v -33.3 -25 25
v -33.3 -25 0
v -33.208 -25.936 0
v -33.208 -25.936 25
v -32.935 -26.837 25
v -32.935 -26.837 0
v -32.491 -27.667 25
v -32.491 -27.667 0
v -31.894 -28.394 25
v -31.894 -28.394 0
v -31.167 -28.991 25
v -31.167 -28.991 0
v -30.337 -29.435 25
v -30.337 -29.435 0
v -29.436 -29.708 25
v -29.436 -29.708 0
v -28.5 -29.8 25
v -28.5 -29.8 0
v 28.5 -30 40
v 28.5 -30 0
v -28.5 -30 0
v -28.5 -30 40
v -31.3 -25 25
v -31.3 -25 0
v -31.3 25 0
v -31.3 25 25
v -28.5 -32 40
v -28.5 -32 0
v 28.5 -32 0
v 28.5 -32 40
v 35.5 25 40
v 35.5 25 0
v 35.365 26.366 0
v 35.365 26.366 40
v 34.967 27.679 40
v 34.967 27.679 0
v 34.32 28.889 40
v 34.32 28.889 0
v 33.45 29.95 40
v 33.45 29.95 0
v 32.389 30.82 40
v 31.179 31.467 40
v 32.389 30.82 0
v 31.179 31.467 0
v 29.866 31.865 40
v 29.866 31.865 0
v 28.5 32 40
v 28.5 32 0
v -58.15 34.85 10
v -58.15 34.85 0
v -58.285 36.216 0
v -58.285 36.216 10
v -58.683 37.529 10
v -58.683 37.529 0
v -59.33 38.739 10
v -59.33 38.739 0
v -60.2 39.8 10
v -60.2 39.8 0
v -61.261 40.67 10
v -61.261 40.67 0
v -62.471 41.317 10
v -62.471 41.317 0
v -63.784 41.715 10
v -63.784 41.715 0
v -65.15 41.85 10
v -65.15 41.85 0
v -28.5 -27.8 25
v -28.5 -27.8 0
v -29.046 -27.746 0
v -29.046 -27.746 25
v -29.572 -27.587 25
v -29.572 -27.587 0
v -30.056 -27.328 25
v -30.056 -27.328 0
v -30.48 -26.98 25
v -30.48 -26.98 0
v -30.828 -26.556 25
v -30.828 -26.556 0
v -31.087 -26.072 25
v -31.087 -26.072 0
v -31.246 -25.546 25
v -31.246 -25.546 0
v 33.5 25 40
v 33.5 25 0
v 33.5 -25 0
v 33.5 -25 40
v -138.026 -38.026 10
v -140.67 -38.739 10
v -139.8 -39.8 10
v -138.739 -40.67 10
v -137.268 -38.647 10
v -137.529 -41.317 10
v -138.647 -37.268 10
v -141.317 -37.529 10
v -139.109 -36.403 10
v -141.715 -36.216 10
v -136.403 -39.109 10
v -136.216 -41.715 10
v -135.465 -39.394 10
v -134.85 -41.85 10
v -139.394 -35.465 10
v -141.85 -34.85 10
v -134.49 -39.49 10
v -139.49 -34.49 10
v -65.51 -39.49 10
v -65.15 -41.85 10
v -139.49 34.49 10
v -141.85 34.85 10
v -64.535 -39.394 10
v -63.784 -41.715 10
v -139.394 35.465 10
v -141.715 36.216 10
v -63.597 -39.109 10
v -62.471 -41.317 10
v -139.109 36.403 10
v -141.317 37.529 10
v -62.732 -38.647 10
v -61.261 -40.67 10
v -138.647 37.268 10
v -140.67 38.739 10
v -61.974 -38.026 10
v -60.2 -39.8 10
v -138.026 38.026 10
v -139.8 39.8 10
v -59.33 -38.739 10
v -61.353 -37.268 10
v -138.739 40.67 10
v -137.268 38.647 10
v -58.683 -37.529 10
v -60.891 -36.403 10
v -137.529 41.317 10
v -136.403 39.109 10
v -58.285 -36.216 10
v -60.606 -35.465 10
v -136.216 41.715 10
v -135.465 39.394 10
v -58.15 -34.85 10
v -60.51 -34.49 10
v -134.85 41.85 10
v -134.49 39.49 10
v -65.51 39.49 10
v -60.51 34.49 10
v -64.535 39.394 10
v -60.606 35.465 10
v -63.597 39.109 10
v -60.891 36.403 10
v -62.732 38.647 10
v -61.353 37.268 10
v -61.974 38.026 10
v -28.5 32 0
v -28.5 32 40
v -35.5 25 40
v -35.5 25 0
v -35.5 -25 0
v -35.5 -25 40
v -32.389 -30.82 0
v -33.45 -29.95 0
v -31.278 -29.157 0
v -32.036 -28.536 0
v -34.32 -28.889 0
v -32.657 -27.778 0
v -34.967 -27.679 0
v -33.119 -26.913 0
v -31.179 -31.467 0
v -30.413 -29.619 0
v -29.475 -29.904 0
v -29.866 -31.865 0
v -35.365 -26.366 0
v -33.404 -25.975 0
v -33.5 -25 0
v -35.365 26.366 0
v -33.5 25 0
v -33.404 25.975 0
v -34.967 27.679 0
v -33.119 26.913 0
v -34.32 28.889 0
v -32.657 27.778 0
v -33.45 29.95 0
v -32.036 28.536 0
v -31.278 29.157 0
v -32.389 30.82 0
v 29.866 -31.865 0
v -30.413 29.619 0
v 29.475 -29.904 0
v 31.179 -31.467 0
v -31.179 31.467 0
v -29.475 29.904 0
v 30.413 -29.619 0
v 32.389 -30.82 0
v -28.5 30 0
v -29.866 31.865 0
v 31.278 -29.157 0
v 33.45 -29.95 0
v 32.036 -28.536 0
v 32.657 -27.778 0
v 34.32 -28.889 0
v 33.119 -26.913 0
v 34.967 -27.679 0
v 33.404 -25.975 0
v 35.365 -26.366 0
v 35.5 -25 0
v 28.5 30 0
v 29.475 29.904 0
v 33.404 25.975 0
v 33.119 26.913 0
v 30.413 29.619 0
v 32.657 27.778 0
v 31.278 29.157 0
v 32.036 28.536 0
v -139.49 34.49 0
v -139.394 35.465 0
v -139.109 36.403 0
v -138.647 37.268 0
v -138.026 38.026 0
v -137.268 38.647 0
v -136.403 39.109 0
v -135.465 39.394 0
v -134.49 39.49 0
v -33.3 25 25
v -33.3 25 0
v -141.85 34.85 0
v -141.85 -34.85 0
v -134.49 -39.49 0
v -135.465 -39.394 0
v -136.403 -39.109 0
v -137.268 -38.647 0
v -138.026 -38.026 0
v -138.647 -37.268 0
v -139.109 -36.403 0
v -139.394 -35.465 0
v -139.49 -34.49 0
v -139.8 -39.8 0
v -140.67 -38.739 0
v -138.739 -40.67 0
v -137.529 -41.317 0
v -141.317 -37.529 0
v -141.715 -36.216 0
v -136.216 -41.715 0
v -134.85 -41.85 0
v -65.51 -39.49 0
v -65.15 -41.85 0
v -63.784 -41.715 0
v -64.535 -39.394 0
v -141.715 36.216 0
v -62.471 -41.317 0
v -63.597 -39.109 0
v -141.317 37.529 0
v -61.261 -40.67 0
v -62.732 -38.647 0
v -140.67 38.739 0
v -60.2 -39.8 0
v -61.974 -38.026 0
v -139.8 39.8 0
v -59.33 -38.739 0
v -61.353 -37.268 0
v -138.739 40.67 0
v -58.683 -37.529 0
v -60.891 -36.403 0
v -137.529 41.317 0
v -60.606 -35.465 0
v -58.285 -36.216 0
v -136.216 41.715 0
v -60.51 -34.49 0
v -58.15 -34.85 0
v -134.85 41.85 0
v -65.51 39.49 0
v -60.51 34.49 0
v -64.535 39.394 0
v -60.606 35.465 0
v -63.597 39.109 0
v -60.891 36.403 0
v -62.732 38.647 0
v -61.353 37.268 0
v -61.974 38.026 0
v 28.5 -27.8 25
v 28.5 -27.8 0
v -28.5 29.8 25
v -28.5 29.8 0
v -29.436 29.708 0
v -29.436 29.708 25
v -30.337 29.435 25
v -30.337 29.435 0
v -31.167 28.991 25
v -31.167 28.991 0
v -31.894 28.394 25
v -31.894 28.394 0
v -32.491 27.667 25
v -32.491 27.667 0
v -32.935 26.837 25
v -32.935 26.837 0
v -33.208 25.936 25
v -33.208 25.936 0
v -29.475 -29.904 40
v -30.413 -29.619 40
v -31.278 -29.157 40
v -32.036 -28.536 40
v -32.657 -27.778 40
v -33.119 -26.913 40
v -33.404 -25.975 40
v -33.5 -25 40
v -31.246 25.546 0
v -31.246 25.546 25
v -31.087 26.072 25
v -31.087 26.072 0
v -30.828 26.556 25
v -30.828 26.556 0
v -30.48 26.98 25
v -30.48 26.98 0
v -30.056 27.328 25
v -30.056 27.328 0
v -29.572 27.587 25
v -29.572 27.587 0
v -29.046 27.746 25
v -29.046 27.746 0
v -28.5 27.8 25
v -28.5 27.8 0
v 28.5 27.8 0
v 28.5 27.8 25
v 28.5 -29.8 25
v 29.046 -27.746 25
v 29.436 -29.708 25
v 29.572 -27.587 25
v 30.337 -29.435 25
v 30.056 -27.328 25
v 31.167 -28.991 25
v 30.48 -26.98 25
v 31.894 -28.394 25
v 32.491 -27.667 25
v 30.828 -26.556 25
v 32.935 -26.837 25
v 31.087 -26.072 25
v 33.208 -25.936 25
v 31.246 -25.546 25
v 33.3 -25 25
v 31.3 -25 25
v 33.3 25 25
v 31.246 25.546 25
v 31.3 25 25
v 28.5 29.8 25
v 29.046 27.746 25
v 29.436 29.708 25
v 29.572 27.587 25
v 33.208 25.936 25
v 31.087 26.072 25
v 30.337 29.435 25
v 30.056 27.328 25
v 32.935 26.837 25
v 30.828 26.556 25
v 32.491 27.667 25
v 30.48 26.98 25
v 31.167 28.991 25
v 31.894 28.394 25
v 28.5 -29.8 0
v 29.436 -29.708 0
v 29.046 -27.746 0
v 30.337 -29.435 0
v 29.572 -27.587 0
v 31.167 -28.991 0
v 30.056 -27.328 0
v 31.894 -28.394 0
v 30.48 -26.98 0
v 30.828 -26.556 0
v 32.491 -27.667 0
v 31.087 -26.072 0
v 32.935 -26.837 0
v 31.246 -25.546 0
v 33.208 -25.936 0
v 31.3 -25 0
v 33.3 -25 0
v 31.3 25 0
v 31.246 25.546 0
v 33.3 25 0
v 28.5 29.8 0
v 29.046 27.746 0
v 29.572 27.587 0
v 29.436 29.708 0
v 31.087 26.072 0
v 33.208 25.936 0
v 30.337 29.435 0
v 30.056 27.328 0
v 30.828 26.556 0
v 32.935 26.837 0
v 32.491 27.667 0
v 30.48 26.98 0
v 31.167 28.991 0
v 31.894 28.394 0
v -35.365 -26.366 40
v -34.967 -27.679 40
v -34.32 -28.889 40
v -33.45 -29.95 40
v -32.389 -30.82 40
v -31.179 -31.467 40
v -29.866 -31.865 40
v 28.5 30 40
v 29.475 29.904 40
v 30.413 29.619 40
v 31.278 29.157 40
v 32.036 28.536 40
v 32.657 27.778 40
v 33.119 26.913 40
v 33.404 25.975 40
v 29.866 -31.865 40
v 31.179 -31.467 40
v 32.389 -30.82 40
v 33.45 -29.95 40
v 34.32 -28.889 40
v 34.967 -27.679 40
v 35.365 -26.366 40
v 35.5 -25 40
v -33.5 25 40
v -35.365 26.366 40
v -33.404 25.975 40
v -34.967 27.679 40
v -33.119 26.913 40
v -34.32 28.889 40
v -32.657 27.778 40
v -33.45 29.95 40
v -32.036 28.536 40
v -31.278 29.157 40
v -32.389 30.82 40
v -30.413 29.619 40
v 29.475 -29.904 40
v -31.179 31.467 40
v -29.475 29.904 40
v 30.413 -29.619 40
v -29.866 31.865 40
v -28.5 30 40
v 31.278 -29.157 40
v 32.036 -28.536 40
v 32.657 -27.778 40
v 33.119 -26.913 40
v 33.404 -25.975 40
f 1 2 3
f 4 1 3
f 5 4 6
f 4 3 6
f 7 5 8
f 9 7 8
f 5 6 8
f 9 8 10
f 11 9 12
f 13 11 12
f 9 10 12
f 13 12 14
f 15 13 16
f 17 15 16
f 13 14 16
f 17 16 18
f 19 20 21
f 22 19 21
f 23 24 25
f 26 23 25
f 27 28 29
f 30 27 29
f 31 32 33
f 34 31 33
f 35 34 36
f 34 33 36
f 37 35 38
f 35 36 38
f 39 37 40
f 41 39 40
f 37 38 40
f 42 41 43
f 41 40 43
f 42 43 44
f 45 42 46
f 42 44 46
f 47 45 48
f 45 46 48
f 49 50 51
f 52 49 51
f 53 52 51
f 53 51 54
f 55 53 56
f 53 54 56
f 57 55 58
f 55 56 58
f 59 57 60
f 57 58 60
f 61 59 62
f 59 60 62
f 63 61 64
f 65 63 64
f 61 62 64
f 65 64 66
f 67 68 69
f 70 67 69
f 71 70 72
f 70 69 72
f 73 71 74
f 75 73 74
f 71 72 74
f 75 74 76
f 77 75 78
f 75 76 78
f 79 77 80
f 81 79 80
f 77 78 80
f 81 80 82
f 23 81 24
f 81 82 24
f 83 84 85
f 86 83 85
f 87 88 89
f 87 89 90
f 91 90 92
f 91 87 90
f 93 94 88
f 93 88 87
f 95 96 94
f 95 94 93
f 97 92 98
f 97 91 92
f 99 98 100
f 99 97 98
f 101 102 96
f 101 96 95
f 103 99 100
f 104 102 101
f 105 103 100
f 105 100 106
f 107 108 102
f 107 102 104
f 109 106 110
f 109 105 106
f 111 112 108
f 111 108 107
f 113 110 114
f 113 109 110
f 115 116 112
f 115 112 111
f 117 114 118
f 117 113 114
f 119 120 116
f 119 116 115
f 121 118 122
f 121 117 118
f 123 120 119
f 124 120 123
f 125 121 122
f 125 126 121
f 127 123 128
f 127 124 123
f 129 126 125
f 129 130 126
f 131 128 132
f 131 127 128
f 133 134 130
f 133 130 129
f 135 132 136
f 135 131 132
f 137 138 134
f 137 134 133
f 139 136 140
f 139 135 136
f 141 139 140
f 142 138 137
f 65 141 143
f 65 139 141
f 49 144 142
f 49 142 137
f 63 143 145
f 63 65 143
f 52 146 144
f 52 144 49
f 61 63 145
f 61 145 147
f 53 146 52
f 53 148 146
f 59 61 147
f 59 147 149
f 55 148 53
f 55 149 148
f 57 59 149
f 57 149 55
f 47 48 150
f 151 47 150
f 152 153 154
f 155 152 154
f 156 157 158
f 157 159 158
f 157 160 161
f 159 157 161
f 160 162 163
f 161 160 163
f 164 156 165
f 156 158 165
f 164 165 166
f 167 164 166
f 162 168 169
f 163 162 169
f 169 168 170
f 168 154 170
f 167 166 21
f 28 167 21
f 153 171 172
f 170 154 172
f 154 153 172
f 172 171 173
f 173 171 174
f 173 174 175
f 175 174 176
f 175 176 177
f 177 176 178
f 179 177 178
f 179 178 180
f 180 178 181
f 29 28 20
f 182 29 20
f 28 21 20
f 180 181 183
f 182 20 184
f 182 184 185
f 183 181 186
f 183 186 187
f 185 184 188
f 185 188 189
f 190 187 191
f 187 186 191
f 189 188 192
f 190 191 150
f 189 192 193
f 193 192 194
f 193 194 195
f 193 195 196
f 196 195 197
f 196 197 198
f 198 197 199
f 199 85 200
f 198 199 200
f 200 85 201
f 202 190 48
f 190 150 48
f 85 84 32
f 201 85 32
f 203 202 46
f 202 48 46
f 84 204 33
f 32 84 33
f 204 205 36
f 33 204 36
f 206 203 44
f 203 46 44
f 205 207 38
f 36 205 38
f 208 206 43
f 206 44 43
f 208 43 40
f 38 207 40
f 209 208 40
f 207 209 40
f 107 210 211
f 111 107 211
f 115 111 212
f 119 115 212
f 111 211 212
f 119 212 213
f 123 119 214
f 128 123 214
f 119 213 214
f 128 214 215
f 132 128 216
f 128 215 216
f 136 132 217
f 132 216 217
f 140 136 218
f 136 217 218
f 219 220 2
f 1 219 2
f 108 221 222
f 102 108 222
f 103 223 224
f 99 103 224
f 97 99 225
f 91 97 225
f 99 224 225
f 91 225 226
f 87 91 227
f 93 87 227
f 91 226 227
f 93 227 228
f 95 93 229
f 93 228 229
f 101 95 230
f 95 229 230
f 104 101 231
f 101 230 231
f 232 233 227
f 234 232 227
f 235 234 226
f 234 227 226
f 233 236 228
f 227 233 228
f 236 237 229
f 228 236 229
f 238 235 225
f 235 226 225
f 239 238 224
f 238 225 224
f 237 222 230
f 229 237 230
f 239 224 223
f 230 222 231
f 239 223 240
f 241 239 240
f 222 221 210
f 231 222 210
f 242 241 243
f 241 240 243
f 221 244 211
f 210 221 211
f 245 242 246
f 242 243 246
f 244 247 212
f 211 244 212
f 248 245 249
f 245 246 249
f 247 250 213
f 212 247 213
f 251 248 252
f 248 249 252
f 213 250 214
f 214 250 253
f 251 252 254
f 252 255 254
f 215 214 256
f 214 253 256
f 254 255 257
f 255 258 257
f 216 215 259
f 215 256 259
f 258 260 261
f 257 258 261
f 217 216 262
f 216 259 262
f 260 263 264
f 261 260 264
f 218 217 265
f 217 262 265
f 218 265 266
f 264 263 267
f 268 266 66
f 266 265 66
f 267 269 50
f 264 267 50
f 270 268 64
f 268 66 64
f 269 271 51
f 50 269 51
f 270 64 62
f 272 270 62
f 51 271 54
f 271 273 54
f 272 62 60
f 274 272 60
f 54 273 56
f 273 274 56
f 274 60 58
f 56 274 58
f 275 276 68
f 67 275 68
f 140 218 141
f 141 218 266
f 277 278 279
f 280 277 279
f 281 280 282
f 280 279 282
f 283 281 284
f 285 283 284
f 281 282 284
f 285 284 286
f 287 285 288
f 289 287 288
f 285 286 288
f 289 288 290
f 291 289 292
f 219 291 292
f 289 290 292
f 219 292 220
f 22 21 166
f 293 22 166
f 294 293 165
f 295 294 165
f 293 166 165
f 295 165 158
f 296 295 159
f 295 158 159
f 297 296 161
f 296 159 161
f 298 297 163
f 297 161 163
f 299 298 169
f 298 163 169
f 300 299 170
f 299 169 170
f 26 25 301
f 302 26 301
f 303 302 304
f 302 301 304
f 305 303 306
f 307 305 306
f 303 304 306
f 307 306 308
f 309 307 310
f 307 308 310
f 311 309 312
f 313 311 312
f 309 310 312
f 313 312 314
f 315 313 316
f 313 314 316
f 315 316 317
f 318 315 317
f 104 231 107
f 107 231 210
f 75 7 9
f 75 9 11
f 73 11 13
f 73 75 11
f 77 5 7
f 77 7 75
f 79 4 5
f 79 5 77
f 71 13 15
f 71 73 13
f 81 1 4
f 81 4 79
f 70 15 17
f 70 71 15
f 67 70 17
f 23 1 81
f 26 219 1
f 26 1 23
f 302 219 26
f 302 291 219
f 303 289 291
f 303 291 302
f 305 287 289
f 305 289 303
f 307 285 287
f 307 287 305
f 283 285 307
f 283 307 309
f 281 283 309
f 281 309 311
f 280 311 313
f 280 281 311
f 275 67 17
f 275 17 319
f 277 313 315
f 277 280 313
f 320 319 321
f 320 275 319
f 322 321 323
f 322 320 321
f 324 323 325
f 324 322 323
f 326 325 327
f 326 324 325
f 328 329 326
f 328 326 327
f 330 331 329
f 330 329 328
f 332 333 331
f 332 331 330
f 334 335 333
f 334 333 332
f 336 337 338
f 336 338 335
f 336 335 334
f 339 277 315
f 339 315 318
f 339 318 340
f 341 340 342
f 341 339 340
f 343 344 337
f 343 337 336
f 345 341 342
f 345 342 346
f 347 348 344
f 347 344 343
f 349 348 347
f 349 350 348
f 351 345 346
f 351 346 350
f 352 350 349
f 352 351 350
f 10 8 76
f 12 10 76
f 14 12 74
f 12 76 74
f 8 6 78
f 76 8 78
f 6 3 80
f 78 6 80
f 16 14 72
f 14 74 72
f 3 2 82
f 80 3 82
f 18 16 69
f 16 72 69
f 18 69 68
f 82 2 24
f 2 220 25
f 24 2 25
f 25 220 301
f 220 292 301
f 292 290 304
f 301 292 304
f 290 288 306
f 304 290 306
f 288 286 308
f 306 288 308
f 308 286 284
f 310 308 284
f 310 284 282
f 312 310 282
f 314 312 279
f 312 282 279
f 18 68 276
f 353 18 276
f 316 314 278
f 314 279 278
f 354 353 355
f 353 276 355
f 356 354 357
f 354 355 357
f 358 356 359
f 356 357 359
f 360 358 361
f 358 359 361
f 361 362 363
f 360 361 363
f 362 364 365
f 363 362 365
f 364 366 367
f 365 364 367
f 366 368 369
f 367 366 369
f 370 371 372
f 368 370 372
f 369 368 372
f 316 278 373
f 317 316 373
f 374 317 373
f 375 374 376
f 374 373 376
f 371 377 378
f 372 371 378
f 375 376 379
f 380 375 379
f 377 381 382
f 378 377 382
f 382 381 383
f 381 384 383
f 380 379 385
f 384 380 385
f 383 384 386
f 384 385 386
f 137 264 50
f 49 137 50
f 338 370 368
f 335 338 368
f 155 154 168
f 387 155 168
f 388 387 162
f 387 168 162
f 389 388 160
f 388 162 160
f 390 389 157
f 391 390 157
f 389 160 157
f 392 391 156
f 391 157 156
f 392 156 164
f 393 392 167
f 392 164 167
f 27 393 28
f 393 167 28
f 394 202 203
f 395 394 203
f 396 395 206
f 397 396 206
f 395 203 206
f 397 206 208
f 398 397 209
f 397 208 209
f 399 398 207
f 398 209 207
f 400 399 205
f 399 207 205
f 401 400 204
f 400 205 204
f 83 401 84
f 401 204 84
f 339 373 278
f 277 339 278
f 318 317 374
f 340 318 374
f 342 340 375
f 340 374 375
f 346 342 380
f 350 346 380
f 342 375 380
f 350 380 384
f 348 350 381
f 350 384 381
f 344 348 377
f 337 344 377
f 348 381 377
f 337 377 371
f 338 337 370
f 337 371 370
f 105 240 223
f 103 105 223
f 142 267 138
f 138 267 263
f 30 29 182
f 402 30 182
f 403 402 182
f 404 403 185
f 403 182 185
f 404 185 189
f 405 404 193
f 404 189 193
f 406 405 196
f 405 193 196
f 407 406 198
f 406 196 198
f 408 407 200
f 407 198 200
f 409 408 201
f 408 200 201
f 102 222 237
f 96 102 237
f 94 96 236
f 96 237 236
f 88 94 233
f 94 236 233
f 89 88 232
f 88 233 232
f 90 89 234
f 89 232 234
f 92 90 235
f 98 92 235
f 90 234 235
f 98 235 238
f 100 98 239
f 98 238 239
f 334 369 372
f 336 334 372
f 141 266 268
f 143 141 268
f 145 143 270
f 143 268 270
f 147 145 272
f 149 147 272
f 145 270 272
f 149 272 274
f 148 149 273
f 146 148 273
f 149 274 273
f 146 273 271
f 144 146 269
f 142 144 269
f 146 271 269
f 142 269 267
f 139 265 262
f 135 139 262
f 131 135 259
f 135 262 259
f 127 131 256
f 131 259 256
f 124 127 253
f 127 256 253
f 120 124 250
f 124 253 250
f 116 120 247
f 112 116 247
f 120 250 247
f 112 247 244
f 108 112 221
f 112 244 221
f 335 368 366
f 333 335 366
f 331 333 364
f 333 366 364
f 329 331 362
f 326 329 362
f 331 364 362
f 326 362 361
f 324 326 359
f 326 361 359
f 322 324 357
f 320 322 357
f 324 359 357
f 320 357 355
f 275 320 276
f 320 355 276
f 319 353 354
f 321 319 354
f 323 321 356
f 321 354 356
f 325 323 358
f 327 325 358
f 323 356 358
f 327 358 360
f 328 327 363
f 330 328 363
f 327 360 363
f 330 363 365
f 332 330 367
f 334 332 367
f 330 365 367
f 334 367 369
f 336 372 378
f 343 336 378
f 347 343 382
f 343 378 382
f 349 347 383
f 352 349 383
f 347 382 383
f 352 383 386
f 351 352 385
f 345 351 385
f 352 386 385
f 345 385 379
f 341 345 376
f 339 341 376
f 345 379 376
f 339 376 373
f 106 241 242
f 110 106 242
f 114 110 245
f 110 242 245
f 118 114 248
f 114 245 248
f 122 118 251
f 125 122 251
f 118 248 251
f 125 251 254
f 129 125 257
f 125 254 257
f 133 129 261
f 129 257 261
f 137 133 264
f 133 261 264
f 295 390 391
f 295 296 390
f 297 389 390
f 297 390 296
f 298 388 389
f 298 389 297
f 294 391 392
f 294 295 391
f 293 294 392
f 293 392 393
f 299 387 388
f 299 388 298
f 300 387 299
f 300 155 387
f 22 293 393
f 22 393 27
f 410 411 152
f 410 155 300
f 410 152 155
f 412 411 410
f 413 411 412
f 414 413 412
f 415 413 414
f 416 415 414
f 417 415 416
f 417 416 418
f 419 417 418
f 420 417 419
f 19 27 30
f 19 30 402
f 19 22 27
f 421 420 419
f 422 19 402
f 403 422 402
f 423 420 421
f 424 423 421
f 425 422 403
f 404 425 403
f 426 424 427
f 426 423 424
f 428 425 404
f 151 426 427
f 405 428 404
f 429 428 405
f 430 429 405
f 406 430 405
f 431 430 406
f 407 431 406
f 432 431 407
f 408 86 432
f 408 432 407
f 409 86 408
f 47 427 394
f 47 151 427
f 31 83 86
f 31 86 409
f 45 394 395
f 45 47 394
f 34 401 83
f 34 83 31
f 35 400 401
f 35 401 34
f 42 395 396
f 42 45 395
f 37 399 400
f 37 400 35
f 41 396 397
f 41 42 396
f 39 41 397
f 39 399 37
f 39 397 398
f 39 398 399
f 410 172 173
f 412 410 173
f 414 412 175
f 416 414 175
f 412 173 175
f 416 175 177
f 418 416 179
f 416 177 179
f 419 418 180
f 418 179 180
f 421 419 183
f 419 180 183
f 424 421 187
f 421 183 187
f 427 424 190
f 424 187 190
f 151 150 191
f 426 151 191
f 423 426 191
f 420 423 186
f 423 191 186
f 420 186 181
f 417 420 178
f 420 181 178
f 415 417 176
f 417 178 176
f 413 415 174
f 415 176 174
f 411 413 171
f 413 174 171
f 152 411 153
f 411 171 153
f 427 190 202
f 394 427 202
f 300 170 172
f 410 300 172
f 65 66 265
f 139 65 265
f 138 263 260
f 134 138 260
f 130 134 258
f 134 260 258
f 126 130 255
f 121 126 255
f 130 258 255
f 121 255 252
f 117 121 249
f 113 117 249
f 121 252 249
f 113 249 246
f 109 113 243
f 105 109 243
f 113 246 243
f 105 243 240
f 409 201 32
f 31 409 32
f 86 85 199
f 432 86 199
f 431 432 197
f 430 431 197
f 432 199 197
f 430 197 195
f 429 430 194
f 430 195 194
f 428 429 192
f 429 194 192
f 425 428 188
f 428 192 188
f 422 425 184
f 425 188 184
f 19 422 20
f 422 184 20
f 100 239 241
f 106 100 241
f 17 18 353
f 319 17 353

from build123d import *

# Parameters (mm, degrees)
F1_DEPTH = 25
F2_DEPTH = 40
F4_DEPTH = 10


with BuildPart() as f1:
    # F0 (on Top) → F1 (new body)
    with BuildSketch(Plane.XY):
        with BuildLine():
            Line((28.5, 29.8), (-28.5, 29.8))
            ThreePointArc((-28.5, 29.8), (-31.894113, 28.394113), (-33.3, 25))
            Line((-33.3, 25), (-33.3, -25))
            ThreePointArc((-33.3, -25), (-31.894113, -28.394113), (-28.5, -29.8))
            Line((-28.5, -29.8), (28.5, -29.8))
            ThreePointArc((28.5, -29.8), (31.894113, -28.394113), (33.3, -25))
            Line((33.3, -25), (33.3, 25))
            ThreePointArc((33.3, 25), (31.894113, 28.394113), (28.5, 29.8))
        make_face()
        with BuildLine():
            ThreePointArc((-31.3, 25), (-30.479899, 26.979899), (-28.5, 27.8))
            Line((-28.5, 27.8), (28.5, 27.8))
            ThreePointArc((28.5, 27.8), (30.479899, 26.979899), (31.3, 25))
            Line((31.3, 25), (31.3, -25))
            ThreePointArc((31.3, -25), (30.479899, -26.979899), (28.5, -27.8))
            Line((28.5, -27.8), (-28.5, -27.8))
            ThreePointArc((-28.5, -27.8), (-30.479899, -26.979899), (-31.3, -25))
            Line((-31.3, -25), (-31.3, 25))
        make_face(mode=Mode.SUBTRACT)
    extrude(amount=F1_DEPTH)


with BuildPart() as f2:
    # F0 (on Top) → F2 (new body)
    with BuildSketch(Plane.XY):
        with BuildLine():
            Line((28.5, 32), (-28.5, 32))
            ThreePointArc((-28.5, 32), (-33.449747, 29.949747), (-35.5, 25))
            Line((-35.5, 25), (-35.5, -25))
            ThreePointArc((-35.5, -25), (-33.449747, -29.949747), (-28.5, -32))
            Line((-28.5, -32), (28.5, -32))
            ThreePointArc((28.5, -32), (33.449747, -29.949747), (35.5, -25))
            Line((35.5, -25), (35.5, 25))
            ThreePointArc((35.5, 25), (33.449747, 29.949747), (28.5, 32))
        make_face()
        with BuildLine():
            ThreePointArc((-33.5, 25), (-32.035534, 28.535534), (-28.5, 30))
            Line((-28.5, 30), (28.5, 30))
            ThreePointArc((28.5, 30), (32.035534, 28.535534), (33.5, 25))
            Line((33.5, 25), (33.5, -25))
            ThreePointArc((33.5, -25), (32.035534, -28.535534), (28.5, -30))
            Line((28.5, -30), (-28.5, -30))
            ThreePointArc((-28.5, -30), (-32.035534, -28.535534), (-33.5, -25))
            Line((-33.5, -25), (-33.5, 25))
        make_face(mode=Mode.SUBTRACT)
    extrude(amount=F2_DEPTH)


with BuildPart() as f4:
    # F3 (on Top) → F4 (new body)
    with BuildSketch(Plane.XY):
        with BuildLine():
            Line((-65.15, 41.85), (-134.85, 41.85))
            ThreePointArc((-134.85, 41.85), (-139.799747, 39.799747), (-141.85, 34.85))
            Line((-141.85, 34.85), (-141.85, -34.85))
            ThreePointArc((-141.85, -34.85), (-139.799747, -39.799747), (-134.85, -41.85))
            Line((-134.85, -41.85), (-65.15, -41.85))
            ThreePointArc((-65.15, -41.85), (-60.200253, -39.799747), (-58.15, -34.85))
            Line((-58.15, -34.85), (-58.15, 34.85))
            ThreePointArc((-58.15, 34.85), (-60.200253, 39.799747), (-65.15, 41.85))
        make_face()
        with BuildLine():
            ThreePointArc((-139.49, 34.49), (-138.025534, 38.025534), (-134.49, 39.49))
            Line((-134.49, 39.49), (-65.51, 39.49))
            ThreePointArc((-65.51, 39.49), (-61.974466, 38.025534), (-60.51, 34.49))
            Line((-60.51, 34.49), (-60.51, -34.49))
            ThreePointArc((-60.51, -34.49), (-61.974466, -38.025534), (-65.51, -39.49))
            Line((-65.51, -39.49), (-134.49, -39.49))
            ThreePointArc((-134.49, -39.49), (-138.025534, -38.025534), (-139.49, -34.49))
            Line((-139.49, -34.49), (-139.49, 34.49))
        make_face(mode=Mode.SUBTRACT)
    extrude(amount=F4_DEPTH)


solid = Compound([f1.part, f2.part, f4.part])
